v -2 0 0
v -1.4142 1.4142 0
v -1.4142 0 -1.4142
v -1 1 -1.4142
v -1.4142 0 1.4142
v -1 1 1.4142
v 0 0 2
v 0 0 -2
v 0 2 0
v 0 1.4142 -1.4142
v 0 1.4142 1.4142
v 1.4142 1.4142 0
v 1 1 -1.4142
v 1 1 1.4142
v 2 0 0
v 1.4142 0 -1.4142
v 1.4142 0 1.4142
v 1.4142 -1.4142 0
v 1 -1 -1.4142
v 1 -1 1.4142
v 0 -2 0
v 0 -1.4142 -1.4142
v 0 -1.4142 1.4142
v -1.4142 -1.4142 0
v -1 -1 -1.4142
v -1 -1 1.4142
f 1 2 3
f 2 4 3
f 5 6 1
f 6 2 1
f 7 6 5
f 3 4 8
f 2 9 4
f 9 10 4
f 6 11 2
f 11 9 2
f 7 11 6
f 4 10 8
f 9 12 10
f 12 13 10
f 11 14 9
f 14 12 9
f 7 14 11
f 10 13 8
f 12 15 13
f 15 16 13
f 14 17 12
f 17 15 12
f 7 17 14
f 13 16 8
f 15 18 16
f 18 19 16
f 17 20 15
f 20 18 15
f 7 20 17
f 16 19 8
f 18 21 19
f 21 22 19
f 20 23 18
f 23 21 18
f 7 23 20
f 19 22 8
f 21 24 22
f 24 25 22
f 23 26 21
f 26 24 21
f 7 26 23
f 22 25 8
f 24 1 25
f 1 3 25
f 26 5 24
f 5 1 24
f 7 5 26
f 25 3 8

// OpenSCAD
// Unit of length: Unit.MM
rotate_extrude(angle = 360.0, $fn = 8)
{
   rotate(a = 270.0)
   {
      intersection()
      {
         circle(d = 4.0, $fn = 8);
         translate(v = [-2.01, 0.0])
         {
            square(size = [4.02, 2.01], center = false);
         }
      }
   }
}
